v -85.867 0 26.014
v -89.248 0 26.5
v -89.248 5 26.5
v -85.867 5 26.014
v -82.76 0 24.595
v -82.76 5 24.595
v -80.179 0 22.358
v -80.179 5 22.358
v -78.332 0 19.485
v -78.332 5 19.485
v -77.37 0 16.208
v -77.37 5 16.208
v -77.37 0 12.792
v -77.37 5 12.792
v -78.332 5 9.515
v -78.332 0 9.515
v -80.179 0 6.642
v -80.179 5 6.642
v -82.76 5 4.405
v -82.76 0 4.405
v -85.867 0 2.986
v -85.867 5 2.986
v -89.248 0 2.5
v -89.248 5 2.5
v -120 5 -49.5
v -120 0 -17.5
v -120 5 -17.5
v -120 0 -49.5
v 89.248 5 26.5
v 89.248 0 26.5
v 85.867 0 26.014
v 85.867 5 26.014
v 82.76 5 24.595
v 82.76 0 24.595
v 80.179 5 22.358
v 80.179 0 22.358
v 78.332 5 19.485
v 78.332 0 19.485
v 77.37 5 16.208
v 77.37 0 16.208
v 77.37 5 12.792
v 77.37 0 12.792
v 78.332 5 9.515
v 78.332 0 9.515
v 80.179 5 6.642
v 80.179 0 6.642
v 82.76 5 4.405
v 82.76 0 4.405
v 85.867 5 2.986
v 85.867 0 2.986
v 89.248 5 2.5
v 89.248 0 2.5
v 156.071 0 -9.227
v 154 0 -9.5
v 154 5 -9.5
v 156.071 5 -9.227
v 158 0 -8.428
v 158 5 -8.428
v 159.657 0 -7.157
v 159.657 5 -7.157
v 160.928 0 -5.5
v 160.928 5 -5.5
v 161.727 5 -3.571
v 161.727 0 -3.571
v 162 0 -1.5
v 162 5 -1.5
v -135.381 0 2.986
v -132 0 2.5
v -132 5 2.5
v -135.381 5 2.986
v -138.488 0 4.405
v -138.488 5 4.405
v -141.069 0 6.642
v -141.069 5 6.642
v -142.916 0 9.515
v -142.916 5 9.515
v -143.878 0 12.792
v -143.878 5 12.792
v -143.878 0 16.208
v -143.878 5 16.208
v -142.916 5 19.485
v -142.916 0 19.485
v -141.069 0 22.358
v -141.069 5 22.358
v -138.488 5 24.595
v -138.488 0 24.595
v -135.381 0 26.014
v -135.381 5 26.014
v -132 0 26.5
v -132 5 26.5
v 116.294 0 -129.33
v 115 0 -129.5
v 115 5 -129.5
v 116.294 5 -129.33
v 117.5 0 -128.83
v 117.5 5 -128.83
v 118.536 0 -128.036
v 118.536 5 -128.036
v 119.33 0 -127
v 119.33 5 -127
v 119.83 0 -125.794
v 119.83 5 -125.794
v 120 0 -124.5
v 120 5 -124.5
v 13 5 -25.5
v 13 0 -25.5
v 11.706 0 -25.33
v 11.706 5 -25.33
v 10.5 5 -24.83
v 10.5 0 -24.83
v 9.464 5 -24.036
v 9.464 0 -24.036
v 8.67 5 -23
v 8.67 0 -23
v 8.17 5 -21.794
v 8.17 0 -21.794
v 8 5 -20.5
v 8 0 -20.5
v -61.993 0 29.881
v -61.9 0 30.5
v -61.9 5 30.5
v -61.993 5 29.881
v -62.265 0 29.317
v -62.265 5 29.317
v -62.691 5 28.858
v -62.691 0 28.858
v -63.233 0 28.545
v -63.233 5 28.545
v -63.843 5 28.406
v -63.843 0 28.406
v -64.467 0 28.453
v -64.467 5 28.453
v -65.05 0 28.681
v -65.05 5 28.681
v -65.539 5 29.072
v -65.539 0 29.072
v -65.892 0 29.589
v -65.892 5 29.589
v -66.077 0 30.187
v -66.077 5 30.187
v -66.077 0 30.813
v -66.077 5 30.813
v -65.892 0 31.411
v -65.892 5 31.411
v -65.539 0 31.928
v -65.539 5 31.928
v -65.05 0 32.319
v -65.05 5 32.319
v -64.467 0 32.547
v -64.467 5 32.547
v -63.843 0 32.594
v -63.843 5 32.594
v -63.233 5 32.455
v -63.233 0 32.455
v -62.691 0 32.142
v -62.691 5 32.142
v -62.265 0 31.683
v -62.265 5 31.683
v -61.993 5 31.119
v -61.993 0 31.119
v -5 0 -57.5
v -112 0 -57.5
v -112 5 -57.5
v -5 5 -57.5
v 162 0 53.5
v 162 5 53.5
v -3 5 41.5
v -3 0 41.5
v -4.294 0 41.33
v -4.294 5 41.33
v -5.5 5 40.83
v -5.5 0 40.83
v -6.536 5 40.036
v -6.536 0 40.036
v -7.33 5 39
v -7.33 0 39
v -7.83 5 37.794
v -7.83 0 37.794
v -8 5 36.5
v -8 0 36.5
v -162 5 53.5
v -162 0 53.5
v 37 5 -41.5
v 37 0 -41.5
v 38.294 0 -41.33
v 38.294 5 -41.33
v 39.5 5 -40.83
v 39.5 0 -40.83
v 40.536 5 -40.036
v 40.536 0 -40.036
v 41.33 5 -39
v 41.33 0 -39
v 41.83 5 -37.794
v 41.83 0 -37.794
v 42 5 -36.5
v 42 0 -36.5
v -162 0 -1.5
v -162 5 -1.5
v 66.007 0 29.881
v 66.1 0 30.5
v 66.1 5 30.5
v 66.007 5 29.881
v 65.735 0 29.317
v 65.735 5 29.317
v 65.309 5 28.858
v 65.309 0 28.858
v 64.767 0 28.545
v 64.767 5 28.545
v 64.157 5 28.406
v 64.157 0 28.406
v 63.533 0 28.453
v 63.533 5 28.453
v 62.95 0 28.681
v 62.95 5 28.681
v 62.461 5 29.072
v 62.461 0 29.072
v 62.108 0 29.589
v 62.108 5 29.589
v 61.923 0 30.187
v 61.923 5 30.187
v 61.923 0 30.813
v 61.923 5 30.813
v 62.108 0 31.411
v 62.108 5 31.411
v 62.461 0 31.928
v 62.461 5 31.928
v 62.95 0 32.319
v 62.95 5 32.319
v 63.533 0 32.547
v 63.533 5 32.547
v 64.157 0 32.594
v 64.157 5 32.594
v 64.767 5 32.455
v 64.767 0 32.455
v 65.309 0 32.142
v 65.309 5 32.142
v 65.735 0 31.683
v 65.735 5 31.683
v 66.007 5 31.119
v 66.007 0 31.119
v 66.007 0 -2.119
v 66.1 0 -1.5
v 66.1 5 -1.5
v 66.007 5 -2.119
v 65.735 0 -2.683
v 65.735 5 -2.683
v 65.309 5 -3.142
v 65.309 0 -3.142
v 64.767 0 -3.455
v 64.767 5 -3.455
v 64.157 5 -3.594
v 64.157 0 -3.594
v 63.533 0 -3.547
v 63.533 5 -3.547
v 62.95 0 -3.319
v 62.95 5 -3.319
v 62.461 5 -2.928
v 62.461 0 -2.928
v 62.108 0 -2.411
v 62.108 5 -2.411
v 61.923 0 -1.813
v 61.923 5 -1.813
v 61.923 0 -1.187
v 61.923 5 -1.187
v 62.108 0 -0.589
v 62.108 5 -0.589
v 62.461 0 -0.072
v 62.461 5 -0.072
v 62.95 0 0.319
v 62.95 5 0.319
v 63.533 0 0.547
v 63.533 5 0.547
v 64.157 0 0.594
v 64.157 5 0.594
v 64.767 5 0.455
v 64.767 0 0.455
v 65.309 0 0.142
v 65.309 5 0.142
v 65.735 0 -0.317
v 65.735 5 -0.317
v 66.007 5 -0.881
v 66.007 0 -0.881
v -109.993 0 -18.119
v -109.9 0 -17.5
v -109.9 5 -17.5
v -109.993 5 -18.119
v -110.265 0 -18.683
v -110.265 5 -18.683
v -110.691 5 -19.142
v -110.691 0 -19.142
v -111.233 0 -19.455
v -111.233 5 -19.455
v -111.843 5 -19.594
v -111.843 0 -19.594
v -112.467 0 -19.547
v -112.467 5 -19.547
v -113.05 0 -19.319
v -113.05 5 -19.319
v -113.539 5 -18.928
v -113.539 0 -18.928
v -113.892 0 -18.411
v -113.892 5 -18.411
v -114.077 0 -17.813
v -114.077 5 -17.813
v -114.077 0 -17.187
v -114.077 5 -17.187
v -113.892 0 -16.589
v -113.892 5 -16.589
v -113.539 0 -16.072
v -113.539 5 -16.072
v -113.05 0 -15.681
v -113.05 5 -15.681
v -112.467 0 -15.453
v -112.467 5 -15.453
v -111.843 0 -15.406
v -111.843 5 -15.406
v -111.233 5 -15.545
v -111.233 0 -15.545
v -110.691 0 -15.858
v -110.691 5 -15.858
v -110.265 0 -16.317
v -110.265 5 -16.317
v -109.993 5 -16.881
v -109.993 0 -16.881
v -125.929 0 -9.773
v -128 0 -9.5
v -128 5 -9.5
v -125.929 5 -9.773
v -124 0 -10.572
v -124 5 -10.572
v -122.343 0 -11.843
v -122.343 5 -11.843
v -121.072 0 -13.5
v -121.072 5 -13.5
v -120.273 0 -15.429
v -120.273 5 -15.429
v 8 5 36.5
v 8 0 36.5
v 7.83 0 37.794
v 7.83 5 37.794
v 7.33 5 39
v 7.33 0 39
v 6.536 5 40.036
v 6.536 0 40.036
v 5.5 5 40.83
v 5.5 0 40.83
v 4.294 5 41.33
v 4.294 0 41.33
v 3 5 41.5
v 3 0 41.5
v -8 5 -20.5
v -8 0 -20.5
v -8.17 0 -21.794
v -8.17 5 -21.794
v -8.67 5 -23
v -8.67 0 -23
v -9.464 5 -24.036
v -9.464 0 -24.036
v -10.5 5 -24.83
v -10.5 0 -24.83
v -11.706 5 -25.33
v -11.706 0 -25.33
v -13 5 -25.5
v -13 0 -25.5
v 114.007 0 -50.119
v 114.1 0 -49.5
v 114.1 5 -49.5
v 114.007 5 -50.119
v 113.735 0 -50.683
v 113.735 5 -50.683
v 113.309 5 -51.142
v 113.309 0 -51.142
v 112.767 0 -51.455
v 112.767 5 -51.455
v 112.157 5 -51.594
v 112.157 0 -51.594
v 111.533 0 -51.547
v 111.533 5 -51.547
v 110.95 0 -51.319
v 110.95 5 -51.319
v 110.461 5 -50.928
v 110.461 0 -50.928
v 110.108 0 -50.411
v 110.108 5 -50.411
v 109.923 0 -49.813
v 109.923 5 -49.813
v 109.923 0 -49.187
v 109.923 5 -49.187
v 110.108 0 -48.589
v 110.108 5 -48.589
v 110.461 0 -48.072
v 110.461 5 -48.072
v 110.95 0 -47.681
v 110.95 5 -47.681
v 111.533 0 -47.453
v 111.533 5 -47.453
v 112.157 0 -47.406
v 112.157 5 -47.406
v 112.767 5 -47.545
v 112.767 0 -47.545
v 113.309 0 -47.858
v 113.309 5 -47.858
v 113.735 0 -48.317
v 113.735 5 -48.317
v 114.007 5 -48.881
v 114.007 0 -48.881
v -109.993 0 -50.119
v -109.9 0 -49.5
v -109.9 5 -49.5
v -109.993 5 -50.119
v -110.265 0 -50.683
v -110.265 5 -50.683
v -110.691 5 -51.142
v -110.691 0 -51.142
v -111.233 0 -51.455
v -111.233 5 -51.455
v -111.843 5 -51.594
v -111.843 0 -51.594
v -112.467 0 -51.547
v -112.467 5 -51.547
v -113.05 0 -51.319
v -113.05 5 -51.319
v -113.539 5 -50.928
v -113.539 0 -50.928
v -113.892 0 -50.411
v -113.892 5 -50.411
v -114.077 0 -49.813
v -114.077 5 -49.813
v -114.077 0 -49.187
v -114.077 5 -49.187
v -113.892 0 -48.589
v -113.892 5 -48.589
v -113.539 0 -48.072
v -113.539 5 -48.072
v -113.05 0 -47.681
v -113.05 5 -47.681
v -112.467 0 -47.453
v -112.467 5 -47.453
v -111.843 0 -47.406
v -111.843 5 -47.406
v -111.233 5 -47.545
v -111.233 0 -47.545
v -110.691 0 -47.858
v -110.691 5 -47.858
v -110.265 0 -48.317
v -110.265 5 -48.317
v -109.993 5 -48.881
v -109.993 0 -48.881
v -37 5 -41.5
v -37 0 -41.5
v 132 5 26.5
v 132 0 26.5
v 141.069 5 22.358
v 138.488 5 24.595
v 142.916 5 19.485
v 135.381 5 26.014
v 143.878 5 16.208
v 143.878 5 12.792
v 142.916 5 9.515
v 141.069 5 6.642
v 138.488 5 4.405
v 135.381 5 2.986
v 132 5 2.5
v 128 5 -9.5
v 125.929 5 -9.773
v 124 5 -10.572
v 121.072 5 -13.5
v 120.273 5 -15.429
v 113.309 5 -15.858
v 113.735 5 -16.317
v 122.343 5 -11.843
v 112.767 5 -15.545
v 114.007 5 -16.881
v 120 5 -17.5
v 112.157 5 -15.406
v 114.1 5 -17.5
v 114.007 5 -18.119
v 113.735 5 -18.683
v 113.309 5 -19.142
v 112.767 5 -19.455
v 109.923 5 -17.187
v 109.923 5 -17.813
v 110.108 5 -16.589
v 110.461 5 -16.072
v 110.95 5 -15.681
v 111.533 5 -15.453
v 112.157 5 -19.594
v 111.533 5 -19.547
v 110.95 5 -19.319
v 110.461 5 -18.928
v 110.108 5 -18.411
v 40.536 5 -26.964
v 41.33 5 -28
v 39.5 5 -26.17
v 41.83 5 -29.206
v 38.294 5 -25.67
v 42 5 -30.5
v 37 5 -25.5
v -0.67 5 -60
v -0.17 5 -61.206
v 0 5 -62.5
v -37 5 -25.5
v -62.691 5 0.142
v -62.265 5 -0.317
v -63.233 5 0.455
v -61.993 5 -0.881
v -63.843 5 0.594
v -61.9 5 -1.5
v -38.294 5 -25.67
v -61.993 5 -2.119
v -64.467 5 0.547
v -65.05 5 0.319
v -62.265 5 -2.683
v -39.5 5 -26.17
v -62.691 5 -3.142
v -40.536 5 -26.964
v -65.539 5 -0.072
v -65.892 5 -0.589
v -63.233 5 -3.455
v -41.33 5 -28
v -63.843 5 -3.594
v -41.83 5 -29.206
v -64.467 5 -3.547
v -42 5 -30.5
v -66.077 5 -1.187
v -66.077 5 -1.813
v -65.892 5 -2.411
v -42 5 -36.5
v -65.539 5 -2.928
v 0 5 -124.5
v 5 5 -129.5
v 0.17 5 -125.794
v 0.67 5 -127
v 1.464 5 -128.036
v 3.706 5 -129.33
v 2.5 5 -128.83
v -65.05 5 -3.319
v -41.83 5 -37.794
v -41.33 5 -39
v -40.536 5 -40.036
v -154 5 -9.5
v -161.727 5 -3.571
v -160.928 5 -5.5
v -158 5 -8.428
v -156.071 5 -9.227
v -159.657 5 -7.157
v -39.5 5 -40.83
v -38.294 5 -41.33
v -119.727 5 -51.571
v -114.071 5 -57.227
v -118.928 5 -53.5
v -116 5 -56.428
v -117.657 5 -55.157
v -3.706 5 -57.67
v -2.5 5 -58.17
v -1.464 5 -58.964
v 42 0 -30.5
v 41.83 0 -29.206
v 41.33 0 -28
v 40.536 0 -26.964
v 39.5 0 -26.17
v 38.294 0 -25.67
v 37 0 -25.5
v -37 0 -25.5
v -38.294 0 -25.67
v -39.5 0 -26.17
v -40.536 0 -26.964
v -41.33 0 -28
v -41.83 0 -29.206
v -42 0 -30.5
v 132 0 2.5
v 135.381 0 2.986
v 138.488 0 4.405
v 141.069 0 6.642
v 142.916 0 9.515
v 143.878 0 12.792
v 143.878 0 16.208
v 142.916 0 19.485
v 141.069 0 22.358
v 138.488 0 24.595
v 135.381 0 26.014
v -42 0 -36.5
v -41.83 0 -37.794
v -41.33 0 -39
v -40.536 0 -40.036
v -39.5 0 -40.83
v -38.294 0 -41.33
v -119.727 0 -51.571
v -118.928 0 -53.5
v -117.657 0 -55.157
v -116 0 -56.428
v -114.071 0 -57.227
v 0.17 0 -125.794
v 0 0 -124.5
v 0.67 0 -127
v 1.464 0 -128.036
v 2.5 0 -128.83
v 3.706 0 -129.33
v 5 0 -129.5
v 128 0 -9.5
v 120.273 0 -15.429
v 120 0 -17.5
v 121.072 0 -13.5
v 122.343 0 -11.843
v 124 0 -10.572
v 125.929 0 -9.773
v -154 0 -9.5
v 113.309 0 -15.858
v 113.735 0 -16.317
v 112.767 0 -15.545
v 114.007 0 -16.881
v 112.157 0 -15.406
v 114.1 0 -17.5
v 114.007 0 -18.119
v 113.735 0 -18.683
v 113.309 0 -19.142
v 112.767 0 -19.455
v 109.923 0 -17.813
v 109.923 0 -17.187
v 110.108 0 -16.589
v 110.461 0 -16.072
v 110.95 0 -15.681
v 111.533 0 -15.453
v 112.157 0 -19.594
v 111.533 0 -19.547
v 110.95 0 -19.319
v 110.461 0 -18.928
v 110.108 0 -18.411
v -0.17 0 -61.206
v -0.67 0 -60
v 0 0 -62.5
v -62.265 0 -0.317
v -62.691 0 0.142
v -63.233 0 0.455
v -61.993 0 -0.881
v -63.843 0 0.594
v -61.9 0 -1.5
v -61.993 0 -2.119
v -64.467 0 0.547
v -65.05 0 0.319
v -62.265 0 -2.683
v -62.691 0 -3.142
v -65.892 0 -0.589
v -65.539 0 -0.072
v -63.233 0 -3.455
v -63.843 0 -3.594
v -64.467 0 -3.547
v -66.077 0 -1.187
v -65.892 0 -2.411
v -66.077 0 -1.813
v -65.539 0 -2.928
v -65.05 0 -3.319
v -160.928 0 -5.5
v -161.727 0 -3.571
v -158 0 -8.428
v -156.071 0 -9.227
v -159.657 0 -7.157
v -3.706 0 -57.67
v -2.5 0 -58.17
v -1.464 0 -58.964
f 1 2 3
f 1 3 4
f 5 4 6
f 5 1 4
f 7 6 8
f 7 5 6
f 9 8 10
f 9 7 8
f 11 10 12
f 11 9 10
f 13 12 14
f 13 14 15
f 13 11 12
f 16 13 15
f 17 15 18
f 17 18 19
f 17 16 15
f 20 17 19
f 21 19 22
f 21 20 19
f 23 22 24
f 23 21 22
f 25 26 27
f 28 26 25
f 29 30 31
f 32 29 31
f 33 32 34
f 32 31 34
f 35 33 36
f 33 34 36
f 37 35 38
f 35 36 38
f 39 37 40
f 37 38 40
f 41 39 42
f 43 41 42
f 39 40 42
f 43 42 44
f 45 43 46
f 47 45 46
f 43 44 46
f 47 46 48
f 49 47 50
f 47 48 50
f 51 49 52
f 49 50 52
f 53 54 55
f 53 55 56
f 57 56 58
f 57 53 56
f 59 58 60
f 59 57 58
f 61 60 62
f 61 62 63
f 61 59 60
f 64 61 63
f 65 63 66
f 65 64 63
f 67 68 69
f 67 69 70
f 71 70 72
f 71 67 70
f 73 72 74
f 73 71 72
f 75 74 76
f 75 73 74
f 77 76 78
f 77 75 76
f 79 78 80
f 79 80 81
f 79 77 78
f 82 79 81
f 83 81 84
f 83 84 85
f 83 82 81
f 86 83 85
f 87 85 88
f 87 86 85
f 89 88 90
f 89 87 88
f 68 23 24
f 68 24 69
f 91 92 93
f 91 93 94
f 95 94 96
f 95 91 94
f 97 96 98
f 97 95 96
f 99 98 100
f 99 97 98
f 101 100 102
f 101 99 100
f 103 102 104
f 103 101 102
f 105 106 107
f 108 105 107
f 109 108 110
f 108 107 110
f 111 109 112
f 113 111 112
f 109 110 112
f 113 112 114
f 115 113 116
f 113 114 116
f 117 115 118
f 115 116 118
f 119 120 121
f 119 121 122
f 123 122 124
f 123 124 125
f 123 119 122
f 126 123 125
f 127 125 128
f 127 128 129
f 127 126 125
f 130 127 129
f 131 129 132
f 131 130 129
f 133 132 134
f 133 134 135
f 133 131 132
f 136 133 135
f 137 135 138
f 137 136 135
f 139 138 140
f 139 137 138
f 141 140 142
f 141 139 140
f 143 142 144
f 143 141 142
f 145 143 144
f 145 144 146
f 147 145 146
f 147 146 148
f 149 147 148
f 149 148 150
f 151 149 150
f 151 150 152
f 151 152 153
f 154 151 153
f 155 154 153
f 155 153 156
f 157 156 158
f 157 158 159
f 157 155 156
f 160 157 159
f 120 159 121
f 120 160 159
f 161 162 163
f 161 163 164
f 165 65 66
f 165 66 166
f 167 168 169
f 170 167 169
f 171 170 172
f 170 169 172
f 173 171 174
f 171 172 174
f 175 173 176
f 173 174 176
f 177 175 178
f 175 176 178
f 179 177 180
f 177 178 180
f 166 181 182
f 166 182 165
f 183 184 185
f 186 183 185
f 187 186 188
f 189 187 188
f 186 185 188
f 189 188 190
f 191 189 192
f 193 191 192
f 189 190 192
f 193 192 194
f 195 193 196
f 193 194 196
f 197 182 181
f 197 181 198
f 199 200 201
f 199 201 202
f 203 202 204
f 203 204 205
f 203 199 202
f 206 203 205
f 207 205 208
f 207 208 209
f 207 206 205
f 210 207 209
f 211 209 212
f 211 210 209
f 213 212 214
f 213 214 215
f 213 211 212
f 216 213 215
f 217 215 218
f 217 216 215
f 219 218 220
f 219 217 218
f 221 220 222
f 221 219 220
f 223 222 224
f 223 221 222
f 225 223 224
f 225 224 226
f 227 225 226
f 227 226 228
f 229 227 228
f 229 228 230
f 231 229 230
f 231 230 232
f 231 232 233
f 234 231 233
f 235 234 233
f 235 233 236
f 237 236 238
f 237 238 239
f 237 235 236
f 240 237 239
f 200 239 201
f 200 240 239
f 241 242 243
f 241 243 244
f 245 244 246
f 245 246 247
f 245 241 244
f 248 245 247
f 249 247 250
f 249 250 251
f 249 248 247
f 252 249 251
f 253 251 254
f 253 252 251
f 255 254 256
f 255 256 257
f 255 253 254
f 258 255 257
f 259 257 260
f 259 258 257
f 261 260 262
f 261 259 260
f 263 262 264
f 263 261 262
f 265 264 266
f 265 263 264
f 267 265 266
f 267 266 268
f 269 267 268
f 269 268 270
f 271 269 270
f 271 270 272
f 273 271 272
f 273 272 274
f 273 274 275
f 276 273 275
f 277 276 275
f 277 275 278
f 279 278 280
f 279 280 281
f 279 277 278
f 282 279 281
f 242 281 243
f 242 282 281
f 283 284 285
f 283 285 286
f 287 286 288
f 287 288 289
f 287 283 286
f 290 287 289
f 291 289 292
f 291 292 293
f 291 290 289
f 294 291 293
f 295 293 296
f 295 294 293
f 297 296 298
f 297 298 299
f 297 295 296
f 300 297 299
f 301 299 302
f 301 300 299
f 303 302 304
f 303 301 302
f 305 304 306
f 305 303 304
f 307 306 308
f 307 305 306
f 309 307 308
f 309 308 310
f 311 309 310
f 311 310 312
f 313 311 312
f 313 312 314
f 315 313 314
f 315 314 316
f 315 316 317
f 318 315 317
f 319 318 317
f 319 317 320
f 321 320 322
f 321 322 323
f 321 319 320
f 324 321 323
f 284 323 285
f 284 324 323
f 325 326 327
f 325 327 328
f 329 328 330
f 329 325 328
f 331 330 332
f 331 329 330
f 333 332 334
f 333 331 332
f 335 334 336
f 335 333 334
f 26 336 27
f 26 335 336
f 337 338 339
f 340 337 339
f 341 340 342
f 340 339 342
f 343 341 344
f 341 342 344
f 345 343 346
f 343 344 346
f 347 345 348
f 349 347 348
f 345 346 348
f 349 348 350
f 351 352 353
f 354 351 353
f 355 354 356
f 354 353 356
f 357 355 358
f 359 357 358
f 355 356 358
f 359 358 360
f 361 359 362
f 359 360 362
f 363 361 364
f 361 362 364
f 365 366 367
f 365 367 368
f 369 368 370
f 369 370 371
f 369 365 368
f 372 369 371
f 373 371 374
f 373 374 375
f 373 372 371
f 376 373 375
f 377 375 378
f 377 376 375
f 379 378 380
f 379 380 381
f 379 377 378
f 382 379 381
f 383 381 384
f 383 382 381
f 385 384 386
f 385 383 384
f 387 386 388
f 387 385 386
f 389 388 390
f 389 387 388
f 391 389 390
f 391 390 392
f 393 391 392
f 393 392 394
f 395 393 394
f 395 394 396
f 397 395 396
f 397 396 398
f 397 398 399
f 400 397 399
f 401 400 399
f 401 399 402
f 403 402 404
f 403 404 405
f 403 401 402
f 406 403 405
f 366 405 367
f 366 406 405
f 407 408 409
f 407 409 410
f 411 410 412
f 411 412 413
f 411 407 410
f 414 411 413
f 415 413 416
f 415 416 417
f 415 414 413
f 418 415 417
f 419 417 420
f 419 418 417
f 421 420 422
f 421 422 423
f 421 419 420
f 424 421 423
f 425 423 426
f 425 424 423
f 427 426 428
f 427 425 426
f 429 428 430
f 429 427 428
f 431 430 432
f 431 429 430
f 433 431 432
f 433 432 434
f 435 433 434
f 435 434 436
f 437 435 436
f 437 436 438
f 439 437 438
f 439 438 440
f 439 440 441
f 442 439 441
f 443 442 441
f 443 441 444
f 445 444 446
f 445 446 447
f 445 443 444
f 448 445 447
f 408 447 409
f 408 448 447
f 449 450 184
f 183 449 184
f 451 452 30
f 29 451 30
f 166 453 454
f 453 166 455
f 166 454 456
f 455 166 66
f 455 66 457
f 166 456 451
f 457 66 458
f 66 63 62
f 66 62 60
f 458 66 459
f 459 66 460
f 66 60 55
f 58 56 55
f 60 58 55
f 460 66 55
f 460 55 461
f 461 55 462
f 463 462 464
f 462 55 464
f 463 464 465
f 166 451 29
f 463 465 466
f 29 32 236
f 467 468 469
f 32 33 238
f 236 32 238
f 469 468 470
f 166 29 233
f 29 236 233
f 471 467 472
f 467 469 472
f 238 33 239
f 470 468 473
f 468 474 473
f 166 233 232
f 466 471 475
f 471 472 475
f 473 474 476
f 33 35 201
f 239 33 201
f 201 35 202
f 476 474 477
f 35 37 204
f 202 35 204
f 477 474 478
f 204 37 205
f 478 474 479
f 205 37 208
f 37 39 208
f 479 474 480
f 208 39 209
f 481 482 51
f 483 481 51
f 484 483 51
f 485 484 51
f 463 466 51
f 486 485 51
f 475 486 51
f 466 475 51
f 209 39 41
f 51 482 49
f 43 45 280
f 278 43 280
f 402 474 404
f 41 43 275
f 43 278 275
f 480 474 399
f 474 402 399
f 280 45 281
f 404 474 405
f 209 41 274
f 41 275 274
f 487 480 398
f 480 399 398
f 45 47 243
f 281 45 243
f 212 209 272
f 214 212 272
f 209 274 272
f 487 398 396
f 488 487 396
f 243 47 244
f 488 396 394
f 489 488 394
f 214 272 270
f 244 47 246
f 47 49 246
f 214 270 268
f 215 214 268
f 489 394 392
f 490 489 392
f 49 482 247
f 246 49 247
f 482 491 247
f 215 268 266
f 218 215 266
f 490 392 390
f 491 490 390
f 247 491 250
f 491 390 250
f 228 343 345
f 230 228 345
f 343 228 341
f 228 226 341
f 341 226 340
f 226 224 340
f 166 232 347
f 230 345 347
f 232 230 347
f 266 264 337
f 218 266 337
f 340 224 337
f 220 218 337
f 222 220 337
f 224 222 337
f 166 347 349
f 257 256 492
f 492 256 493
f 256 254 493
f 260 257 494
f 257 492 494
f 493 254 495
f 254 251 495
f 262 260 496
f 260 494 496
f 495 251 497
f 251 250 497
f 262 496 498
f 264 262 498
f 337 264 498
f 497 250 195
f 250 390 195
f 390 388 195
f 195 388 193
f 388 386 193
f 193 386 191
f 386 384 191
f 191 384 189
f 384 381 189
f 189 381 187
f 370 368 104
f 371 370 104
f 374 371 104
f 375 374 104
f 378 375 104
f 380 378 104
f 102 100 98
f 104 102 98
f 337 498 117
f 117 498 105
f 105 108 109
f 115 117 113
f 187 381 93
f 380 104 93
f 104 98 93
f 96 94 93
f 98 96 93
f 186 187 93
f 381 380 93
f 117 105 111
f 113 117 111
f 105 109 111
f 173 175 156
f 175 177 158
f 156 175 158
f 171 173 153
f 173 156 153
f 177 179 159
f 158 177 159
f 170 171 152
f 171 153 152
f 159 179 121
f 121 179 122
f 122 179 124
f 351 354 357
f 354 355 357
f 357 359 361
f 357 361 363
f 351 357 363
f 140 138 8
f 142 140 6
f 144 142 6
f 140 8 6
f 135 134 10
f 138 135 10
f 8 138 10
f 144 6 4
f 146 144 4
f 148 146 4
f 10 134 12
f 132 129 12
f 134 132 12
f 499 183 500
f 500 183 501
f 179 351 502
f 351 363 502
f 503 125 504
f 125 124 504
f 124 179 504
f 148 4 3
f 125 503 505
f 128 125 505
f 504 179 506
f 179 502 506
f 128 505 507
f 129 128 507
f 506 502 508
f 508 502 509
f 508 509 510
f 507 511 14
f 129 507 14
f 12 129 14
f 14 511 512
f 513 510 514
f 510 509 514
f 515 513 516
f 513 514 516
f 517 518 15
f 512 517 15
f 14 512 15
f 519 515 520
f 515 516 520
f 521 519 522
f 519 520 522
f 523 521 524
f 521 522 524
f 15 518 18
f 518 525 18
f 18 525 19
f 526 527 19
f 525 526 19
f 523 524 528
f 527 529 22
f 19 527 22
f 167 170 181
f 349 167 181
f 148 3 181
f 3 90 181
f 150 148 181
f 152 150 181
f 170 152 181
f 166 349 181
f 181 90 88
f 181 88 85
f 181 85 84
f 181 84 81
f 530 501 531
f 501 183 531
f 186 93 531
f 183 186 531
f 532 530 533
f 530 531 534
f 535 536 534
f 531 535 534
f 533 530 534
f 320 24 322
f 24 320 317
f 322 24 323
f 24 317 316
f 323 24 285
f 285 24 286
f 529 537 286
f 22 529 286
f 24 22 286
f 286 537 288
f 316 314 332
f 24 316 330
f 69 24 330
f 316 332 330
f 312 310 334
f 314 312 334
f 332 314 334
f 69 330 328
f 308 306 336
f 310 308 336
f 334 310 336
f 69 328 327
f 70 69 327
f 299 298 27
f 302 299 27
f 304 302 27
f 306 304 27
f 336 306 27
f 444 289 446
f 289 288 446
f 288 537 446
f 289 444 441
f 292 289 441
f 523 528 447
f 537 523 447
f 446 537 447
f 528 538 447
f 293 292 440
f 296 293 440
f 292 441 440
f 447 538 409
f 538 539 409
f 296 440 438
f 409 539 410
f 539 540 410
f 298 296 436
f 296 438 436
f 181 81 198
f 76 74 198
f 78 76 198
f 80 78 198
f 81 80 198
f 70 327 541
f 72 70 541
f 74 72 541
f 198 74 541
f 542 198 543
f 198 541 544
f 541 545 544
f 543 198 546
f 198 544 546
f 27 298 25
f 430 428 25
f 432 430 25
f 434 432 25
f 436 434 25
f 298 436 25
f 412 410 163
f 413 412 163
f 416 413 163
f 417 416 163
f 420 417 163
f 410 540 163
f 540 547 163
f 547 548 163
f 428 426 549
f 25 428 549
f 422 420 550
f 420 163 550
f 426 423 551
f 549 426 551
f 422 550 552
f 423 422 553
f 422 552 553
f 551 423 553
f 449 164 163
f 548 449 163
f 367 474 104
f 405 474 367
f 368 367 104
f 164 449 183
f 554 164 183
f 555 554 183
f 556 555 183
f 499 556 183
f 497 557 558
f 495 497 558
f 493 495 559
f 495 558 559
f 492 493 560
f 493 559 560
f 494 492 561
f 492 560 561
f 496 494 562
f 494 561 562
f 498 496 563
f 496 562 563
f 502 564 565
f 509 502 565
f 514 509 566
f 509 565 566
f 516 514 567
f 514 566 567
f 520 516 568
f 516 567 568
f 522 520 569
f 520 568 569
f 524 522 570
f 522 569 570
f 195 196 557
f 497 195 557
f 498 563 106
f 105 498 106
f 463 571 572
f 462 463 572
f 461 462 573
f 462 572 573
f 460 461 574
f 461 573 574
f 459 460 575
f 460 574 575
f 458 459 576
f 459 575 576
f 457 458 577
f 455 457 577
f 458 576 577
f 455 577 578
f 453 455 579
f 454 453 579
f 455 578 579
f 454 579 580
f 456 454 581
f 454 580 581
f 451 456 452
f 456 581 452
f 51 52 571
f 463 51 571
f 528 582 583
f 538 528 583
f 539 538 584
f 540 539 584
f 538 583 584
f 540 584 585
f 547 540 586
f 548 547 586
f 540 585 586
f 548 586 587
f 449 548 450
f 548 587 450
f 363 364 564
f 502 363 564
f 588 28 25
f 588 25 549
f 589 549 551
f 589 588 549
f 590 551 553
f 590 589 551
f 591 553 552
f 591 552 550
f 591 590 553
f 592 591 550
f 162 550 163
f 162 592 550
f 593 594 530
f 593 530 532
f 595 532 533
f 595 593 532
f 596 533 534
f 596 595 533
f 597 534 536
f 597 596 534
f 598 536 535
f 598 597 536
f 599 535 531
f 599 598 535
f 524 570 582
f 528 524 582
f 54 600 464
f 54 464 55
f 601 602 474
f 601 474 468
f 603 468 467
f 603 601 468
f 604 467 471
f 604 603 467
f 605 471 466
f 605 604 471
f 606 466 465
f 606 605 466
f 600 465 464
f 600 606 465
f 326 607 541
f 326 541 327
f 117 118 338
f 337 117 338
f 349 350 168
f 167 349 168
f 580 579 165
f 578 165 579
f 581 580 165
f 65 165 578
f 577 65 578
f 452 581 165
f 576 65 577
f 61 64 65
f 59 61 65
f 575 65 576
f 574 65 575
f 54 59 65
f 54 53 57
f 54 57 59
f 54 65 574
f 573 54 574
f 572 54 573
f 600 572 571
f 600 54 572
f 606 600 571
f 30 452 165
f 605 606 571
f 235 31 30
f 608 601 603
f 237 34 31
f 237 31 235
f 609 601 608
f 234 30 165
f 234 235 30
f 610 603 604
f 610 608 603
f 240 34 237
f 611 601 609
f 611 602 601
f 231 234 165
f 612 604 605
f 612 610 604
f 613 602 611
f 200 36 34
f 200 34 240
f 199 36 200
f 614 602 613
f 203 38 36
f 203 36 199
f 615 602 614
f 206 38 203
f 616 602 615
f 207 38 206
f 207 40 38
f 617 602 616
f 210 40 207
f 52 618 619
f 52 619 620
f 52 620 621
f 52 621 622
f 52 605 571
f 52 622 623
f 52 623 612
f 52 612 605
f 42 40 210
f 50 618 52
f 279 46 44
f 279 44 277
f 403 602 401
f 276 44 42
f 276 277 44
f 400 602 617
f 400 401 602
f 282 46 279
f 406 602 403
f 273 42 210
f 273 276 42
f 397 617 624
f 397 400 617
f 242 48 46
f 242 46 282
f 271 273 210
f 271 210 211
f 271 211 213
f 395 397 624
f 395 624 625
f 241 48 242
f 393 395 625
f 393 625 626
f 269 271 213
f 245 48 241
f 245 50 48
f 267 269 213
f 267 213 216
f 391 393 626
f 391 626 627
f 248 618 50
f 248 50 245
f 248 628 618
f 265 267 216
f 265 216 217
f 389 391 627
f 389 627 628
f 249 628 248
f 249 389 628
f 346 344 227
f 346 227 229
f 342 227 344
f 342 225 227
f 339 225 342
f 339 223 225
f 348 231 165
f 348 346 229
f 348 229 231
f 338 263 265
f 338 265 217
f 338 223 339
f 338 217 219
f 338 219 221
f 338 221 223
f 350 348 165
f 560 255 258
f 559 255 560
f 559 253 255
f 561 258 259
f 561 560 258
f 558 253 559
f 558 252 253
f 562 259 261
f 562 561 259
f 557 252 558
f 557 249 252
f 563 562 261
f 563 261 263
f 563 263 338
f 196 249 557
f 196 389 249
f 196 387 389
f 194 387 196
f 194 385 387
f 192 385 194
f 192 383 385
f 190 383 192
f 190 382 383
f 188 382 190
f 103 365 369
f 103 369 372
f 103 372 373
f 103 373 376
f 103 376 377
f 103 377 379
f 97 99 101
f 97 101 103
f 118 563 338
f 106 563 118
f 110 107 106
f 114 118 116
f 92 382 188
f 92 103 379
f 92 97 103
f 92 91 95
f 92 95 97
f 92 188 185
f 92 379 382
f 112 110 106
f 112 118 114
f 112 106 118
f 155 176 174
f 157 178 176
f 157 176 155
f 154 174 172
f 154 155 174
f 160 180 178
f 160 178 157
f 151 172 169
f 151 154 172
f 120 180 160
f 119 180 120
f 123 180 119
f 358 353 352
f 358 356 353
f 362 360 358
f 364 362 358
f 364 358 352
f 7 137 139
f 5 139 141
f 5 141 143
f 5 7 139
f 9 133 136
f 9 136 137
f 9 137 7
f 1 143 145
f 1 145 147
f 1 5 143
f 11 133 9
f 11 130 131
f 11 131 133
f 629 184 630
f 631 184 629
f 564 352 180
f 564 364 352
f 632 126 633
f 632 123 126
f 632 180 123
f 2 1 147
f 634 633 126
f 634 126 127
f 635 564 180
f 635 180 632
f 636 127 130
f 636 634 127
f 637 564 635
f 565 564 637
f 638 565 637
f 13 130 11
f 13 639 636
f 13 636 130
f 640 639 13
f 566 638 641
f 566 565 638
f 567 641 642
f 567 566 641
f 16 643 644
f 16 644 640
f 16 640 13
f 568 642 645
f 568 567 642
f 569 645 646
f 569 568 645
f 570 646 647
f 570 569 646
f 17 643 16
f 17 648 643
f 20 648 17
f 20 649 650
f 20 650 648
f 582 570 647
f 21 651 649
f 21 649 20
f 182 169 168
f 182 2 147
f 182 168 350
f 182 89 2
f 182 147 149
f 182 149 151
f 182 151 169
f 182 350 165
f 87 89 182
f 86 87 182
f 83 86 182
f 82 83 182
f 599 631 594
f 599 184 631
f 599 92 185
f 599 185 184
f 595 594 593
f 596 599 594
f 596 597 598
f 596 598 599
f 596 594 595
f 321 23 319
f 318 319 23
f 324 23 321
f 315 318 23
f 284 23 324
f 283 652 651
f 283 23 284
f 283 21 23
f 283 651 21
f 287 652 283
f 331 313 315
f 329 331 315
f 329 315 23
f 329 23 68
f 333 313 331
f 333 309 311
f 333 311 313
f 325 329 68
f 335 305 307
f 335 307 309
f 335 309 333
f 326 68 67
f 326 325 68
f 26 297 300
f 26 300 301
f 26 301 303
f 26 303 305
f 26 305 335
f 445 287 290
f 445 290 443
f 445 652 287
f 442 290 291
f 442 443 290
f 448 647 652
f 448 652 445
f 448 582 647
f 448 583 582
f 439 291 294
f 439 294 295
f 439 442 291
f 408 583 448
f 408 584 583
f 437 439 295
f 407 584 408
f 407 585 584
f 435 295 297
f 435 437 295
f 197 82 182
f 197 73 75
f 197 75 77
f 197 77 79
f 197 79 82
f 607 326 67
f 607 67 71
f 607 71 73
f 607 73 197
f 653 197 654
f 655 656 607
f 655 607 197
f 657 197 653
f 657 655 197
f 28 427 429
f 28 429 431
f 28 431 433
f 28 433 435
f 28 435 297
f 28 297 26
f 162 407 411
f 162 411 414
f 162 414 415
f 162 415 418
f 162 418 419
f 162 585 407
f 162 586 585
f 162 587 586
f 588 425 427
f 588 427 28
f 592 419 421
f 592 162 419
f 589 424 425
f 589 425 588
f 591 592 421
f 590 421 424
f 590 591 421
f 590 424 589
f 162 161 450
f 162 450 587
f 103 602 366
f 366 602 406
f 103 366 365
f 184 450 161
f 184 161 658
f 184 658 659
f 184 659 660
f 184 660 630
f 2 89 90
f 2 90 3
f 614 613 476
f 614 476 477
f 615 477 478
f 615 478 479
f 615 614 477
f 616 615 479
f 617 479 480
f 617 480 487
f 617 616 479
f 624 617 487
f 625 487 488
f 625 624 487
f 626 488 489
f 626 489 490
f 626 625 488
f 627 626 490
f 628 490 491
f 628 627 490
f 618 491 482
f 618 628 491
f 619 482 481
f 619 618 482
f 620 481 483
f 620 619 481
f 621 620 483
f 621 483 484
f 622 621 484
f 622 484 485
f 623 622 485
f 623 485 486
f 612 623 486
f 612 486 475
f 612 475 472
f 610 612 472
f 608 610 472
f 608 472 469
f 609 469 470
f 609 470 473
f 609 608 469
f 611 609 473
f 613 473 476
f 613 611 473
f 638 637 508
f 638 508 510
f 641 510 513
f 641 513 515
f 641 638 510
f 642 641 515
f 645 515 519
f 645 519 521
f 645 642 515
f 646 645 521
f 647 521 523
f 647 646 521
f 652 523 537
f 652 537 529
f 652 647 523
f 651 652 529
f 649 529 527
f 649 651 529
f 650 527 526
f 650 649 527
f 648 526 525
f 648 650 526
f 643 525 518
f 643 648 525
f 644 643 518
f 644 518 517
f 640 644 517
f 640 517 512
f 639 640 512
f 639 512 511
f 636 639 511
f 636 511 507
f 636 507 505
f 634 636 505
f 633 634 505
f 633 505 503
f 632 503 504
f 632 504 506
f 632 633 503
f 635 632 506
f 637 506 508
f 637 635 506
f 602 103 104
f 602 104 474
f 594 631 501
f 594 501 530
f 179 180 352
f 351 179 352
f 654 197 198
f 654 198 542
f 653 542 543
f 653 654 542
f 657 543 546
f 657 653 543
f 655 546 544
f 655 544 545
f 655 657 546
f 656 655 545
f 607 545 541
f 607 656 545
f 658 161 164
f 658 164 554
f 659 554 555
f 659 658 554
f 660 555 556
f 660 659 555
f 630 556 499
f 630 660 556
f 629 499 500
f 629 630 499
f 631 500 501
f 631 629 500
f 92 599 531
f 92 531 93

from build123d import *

# Parameters (mm, degrees)
SKETCH1_R               = 2.1
BOSS_EXTRUDE2_DEPTH     = 5
SKETCH2_W               = 324
SKETCH2_H               = 4
CUT_EXTRUDE1_DEPTH      = 1
CUT_EXTRUDE1_DEPTH_BACK = 6


with BuildPart() as part:
    # Sketch1 → Boss-Extrude2 (new body)
    with BuildSketch(Plane(origin=(0, 0, 0), x_dir=(1, 0, 0), z_dir=(0, 1, 0))):
        with BuildLine():
            Line((-112, 57.5), (-5, 57.5))
            ThreePointArc((-5, 57.5), (-1.464466094, 58.964466094), (0, 62.5))
            Line((0, 62.5), (0, 124.5))
            ThreePointArc((0, 124.5), (1.464466094, 128.035533906), (5, 129.5))
            Line((5, 129.5), (115, 129.5))
            ThreePointArc((115, 129.5), (118.535533906, 128.035533906), (120, 124.5))
            Line((120, 124.5), (120, 49.5))
            Line((120, 49.5), (120, 17.5))
            ThreePointArc((120, 17.5), (122.343145751, 11.843145751), (128, 9.5))
            Line((128, 9.5), (154, 9.5))
            ThreePointArc((154, 9.5), (159.656854249, 7.156854249), (162, 1.5))
            Line((162, 1.5), (162, -57.5))
            Line((162, -57.5), (-162, -57.5))
            Line((-162, -57.5), (-162, 1.5))
            ThreePointArc((-162, 1.5), (-159.656854249, 7.156854249), (-154, 9.5))
            Line((-154, 9.5), (-128, 9.5))
            ThreePointArc((-128, 9.5), (-122.343145751, 11.843145751), (-120, 17.5))
            Line((-120, 17.5), (-120, 49.5))
            ThreePointArc((-120, 49.5), (-117.656854249, 55.156854249), (-112, 57.5))
        make_face()
        with Locations((112, 49.5)):
            Circle(SKETCH1_R, mode=Mode.SUBTRACT)
        with Locations((112, 17.5)):
            Circle(SKETCH1_R, mode=Mode.SUBTRACT)
        with Locations((64, -30.5)):
            Circle(SKETCH1_R, mode=Mode.SUBTRACT)
        with Locations((64, 1.5)):
            Circle(SKETCH1_R, mode=Mode.SUBTRACT)
        with Locations((-112, 17.5)):
            Circle(SKETCH1_R, mode=Mode.SUBTRACT)
        with Locations((-112, 49.5)):
            Circle(SKETCH1_R, mode=Mode.SUBTRACT)
        with Locations((-64, 1.5)):
            Circle(SKETCH1_R, mode=Mode.SUBTRACT)
        with Locations((-64, -30.5)):
            Circle(SKETCH1_R, mode=Mode.SUBTRACT)
        with BuildLine():
            Line((8, 20.5), (8, -36.5))
            ThreePointArc((8, -36.5), (6.535533906, -40.035533906), (3, -41.5))
            Line((3, -41.5), (-3, -41.5))
            ThreePointArc((-3, -41.5), (-6.535533906, -40.035533906), (-8, -36.5))
            Line((-8, -36.5), (-8, 20.5))
            ThreePointArc((-8, 20.5), (-9.464466094, 24.035533906), (-13, 25.5))
            Line((-13, 25.5), (-37, 25.5))
            ThreePointArc((-37, 25.5), (-40.535533906, 26.964466094), (-42, 30.5))
            Line((-42, 30.5), (-42, 36.5))
            ThreePointArc((-42, 36.5), (-40.535533906, 40.035533906), (-37, 41.5))
            Line((-37, 41.5), (37, 41.5))
            ThreePointArc((37, 41.5), (40.535533906, 40.035533906), (42, 36.5))
            Line((42, 36.5), (42, 30.5))
            ThreePointArc((42, 30.5), (40.535533906, 26.964466094), (37, 25.5))
            Line((37, 25.5), (13, 25.5))
            ThreePointArc((13, 25.5), (9.464466094, 24.035533906), (8, 20.5))
        make_face(mode=Mode.SUBTRACT)
        with BuildLine():
            Line((132, -26.5), (89.247795496, -26.5))
            ThreePointArc((89.247795496, -26.5), (77.247795496, -14.5), (89.247795496, -2.5))
            Line((89.247795496, -2.5), (132, -2.5))
            ThreePointArc((132, -2.5), (144, -14.5), (132, -26.5))
        make_face(mode=Mode.SUBTRACT)
        with BuildLine():
            Line((-132, -26.5), (-89.247795496, -26.5))
            ThreePointArc((-89.247795496, -26.5), (-77.247795496, -14.5), (-89.247795496, -2.5))
            Line((-89.247795496, -2.5), (-132, -2.5))
            ThreePointArc((-132, -2.5), (-144, -14.5), (-132, -26.5))
        make_face(mode=Mode.SUBTRACT)
    extrude(amount=BOSS_EXTRUDE2_DEPTH)

    # Sketch2 → Cut-Extrude1 (cut, two sides)
    with BuildSketch(Plane(origin=(0, 5, 0), x_dir=(1, 0, 0), z_dir=(0, 1, 0))) as cut_extrude1_sk:
        with Locations((0, -55.5)):
            Rectangle(SKETCH2_W, SKETCH2_H)
    extrude(amount=CUT_EXTRUDE1_DEPTH, mode=Mode.SUBTRACT)
    extrude(cut_extrude1_sk.sketch, amount=-CUT_EXTRUDE1_DEPTH_BACK, mode=Mode.SUBTRACT)


solid = part.part
